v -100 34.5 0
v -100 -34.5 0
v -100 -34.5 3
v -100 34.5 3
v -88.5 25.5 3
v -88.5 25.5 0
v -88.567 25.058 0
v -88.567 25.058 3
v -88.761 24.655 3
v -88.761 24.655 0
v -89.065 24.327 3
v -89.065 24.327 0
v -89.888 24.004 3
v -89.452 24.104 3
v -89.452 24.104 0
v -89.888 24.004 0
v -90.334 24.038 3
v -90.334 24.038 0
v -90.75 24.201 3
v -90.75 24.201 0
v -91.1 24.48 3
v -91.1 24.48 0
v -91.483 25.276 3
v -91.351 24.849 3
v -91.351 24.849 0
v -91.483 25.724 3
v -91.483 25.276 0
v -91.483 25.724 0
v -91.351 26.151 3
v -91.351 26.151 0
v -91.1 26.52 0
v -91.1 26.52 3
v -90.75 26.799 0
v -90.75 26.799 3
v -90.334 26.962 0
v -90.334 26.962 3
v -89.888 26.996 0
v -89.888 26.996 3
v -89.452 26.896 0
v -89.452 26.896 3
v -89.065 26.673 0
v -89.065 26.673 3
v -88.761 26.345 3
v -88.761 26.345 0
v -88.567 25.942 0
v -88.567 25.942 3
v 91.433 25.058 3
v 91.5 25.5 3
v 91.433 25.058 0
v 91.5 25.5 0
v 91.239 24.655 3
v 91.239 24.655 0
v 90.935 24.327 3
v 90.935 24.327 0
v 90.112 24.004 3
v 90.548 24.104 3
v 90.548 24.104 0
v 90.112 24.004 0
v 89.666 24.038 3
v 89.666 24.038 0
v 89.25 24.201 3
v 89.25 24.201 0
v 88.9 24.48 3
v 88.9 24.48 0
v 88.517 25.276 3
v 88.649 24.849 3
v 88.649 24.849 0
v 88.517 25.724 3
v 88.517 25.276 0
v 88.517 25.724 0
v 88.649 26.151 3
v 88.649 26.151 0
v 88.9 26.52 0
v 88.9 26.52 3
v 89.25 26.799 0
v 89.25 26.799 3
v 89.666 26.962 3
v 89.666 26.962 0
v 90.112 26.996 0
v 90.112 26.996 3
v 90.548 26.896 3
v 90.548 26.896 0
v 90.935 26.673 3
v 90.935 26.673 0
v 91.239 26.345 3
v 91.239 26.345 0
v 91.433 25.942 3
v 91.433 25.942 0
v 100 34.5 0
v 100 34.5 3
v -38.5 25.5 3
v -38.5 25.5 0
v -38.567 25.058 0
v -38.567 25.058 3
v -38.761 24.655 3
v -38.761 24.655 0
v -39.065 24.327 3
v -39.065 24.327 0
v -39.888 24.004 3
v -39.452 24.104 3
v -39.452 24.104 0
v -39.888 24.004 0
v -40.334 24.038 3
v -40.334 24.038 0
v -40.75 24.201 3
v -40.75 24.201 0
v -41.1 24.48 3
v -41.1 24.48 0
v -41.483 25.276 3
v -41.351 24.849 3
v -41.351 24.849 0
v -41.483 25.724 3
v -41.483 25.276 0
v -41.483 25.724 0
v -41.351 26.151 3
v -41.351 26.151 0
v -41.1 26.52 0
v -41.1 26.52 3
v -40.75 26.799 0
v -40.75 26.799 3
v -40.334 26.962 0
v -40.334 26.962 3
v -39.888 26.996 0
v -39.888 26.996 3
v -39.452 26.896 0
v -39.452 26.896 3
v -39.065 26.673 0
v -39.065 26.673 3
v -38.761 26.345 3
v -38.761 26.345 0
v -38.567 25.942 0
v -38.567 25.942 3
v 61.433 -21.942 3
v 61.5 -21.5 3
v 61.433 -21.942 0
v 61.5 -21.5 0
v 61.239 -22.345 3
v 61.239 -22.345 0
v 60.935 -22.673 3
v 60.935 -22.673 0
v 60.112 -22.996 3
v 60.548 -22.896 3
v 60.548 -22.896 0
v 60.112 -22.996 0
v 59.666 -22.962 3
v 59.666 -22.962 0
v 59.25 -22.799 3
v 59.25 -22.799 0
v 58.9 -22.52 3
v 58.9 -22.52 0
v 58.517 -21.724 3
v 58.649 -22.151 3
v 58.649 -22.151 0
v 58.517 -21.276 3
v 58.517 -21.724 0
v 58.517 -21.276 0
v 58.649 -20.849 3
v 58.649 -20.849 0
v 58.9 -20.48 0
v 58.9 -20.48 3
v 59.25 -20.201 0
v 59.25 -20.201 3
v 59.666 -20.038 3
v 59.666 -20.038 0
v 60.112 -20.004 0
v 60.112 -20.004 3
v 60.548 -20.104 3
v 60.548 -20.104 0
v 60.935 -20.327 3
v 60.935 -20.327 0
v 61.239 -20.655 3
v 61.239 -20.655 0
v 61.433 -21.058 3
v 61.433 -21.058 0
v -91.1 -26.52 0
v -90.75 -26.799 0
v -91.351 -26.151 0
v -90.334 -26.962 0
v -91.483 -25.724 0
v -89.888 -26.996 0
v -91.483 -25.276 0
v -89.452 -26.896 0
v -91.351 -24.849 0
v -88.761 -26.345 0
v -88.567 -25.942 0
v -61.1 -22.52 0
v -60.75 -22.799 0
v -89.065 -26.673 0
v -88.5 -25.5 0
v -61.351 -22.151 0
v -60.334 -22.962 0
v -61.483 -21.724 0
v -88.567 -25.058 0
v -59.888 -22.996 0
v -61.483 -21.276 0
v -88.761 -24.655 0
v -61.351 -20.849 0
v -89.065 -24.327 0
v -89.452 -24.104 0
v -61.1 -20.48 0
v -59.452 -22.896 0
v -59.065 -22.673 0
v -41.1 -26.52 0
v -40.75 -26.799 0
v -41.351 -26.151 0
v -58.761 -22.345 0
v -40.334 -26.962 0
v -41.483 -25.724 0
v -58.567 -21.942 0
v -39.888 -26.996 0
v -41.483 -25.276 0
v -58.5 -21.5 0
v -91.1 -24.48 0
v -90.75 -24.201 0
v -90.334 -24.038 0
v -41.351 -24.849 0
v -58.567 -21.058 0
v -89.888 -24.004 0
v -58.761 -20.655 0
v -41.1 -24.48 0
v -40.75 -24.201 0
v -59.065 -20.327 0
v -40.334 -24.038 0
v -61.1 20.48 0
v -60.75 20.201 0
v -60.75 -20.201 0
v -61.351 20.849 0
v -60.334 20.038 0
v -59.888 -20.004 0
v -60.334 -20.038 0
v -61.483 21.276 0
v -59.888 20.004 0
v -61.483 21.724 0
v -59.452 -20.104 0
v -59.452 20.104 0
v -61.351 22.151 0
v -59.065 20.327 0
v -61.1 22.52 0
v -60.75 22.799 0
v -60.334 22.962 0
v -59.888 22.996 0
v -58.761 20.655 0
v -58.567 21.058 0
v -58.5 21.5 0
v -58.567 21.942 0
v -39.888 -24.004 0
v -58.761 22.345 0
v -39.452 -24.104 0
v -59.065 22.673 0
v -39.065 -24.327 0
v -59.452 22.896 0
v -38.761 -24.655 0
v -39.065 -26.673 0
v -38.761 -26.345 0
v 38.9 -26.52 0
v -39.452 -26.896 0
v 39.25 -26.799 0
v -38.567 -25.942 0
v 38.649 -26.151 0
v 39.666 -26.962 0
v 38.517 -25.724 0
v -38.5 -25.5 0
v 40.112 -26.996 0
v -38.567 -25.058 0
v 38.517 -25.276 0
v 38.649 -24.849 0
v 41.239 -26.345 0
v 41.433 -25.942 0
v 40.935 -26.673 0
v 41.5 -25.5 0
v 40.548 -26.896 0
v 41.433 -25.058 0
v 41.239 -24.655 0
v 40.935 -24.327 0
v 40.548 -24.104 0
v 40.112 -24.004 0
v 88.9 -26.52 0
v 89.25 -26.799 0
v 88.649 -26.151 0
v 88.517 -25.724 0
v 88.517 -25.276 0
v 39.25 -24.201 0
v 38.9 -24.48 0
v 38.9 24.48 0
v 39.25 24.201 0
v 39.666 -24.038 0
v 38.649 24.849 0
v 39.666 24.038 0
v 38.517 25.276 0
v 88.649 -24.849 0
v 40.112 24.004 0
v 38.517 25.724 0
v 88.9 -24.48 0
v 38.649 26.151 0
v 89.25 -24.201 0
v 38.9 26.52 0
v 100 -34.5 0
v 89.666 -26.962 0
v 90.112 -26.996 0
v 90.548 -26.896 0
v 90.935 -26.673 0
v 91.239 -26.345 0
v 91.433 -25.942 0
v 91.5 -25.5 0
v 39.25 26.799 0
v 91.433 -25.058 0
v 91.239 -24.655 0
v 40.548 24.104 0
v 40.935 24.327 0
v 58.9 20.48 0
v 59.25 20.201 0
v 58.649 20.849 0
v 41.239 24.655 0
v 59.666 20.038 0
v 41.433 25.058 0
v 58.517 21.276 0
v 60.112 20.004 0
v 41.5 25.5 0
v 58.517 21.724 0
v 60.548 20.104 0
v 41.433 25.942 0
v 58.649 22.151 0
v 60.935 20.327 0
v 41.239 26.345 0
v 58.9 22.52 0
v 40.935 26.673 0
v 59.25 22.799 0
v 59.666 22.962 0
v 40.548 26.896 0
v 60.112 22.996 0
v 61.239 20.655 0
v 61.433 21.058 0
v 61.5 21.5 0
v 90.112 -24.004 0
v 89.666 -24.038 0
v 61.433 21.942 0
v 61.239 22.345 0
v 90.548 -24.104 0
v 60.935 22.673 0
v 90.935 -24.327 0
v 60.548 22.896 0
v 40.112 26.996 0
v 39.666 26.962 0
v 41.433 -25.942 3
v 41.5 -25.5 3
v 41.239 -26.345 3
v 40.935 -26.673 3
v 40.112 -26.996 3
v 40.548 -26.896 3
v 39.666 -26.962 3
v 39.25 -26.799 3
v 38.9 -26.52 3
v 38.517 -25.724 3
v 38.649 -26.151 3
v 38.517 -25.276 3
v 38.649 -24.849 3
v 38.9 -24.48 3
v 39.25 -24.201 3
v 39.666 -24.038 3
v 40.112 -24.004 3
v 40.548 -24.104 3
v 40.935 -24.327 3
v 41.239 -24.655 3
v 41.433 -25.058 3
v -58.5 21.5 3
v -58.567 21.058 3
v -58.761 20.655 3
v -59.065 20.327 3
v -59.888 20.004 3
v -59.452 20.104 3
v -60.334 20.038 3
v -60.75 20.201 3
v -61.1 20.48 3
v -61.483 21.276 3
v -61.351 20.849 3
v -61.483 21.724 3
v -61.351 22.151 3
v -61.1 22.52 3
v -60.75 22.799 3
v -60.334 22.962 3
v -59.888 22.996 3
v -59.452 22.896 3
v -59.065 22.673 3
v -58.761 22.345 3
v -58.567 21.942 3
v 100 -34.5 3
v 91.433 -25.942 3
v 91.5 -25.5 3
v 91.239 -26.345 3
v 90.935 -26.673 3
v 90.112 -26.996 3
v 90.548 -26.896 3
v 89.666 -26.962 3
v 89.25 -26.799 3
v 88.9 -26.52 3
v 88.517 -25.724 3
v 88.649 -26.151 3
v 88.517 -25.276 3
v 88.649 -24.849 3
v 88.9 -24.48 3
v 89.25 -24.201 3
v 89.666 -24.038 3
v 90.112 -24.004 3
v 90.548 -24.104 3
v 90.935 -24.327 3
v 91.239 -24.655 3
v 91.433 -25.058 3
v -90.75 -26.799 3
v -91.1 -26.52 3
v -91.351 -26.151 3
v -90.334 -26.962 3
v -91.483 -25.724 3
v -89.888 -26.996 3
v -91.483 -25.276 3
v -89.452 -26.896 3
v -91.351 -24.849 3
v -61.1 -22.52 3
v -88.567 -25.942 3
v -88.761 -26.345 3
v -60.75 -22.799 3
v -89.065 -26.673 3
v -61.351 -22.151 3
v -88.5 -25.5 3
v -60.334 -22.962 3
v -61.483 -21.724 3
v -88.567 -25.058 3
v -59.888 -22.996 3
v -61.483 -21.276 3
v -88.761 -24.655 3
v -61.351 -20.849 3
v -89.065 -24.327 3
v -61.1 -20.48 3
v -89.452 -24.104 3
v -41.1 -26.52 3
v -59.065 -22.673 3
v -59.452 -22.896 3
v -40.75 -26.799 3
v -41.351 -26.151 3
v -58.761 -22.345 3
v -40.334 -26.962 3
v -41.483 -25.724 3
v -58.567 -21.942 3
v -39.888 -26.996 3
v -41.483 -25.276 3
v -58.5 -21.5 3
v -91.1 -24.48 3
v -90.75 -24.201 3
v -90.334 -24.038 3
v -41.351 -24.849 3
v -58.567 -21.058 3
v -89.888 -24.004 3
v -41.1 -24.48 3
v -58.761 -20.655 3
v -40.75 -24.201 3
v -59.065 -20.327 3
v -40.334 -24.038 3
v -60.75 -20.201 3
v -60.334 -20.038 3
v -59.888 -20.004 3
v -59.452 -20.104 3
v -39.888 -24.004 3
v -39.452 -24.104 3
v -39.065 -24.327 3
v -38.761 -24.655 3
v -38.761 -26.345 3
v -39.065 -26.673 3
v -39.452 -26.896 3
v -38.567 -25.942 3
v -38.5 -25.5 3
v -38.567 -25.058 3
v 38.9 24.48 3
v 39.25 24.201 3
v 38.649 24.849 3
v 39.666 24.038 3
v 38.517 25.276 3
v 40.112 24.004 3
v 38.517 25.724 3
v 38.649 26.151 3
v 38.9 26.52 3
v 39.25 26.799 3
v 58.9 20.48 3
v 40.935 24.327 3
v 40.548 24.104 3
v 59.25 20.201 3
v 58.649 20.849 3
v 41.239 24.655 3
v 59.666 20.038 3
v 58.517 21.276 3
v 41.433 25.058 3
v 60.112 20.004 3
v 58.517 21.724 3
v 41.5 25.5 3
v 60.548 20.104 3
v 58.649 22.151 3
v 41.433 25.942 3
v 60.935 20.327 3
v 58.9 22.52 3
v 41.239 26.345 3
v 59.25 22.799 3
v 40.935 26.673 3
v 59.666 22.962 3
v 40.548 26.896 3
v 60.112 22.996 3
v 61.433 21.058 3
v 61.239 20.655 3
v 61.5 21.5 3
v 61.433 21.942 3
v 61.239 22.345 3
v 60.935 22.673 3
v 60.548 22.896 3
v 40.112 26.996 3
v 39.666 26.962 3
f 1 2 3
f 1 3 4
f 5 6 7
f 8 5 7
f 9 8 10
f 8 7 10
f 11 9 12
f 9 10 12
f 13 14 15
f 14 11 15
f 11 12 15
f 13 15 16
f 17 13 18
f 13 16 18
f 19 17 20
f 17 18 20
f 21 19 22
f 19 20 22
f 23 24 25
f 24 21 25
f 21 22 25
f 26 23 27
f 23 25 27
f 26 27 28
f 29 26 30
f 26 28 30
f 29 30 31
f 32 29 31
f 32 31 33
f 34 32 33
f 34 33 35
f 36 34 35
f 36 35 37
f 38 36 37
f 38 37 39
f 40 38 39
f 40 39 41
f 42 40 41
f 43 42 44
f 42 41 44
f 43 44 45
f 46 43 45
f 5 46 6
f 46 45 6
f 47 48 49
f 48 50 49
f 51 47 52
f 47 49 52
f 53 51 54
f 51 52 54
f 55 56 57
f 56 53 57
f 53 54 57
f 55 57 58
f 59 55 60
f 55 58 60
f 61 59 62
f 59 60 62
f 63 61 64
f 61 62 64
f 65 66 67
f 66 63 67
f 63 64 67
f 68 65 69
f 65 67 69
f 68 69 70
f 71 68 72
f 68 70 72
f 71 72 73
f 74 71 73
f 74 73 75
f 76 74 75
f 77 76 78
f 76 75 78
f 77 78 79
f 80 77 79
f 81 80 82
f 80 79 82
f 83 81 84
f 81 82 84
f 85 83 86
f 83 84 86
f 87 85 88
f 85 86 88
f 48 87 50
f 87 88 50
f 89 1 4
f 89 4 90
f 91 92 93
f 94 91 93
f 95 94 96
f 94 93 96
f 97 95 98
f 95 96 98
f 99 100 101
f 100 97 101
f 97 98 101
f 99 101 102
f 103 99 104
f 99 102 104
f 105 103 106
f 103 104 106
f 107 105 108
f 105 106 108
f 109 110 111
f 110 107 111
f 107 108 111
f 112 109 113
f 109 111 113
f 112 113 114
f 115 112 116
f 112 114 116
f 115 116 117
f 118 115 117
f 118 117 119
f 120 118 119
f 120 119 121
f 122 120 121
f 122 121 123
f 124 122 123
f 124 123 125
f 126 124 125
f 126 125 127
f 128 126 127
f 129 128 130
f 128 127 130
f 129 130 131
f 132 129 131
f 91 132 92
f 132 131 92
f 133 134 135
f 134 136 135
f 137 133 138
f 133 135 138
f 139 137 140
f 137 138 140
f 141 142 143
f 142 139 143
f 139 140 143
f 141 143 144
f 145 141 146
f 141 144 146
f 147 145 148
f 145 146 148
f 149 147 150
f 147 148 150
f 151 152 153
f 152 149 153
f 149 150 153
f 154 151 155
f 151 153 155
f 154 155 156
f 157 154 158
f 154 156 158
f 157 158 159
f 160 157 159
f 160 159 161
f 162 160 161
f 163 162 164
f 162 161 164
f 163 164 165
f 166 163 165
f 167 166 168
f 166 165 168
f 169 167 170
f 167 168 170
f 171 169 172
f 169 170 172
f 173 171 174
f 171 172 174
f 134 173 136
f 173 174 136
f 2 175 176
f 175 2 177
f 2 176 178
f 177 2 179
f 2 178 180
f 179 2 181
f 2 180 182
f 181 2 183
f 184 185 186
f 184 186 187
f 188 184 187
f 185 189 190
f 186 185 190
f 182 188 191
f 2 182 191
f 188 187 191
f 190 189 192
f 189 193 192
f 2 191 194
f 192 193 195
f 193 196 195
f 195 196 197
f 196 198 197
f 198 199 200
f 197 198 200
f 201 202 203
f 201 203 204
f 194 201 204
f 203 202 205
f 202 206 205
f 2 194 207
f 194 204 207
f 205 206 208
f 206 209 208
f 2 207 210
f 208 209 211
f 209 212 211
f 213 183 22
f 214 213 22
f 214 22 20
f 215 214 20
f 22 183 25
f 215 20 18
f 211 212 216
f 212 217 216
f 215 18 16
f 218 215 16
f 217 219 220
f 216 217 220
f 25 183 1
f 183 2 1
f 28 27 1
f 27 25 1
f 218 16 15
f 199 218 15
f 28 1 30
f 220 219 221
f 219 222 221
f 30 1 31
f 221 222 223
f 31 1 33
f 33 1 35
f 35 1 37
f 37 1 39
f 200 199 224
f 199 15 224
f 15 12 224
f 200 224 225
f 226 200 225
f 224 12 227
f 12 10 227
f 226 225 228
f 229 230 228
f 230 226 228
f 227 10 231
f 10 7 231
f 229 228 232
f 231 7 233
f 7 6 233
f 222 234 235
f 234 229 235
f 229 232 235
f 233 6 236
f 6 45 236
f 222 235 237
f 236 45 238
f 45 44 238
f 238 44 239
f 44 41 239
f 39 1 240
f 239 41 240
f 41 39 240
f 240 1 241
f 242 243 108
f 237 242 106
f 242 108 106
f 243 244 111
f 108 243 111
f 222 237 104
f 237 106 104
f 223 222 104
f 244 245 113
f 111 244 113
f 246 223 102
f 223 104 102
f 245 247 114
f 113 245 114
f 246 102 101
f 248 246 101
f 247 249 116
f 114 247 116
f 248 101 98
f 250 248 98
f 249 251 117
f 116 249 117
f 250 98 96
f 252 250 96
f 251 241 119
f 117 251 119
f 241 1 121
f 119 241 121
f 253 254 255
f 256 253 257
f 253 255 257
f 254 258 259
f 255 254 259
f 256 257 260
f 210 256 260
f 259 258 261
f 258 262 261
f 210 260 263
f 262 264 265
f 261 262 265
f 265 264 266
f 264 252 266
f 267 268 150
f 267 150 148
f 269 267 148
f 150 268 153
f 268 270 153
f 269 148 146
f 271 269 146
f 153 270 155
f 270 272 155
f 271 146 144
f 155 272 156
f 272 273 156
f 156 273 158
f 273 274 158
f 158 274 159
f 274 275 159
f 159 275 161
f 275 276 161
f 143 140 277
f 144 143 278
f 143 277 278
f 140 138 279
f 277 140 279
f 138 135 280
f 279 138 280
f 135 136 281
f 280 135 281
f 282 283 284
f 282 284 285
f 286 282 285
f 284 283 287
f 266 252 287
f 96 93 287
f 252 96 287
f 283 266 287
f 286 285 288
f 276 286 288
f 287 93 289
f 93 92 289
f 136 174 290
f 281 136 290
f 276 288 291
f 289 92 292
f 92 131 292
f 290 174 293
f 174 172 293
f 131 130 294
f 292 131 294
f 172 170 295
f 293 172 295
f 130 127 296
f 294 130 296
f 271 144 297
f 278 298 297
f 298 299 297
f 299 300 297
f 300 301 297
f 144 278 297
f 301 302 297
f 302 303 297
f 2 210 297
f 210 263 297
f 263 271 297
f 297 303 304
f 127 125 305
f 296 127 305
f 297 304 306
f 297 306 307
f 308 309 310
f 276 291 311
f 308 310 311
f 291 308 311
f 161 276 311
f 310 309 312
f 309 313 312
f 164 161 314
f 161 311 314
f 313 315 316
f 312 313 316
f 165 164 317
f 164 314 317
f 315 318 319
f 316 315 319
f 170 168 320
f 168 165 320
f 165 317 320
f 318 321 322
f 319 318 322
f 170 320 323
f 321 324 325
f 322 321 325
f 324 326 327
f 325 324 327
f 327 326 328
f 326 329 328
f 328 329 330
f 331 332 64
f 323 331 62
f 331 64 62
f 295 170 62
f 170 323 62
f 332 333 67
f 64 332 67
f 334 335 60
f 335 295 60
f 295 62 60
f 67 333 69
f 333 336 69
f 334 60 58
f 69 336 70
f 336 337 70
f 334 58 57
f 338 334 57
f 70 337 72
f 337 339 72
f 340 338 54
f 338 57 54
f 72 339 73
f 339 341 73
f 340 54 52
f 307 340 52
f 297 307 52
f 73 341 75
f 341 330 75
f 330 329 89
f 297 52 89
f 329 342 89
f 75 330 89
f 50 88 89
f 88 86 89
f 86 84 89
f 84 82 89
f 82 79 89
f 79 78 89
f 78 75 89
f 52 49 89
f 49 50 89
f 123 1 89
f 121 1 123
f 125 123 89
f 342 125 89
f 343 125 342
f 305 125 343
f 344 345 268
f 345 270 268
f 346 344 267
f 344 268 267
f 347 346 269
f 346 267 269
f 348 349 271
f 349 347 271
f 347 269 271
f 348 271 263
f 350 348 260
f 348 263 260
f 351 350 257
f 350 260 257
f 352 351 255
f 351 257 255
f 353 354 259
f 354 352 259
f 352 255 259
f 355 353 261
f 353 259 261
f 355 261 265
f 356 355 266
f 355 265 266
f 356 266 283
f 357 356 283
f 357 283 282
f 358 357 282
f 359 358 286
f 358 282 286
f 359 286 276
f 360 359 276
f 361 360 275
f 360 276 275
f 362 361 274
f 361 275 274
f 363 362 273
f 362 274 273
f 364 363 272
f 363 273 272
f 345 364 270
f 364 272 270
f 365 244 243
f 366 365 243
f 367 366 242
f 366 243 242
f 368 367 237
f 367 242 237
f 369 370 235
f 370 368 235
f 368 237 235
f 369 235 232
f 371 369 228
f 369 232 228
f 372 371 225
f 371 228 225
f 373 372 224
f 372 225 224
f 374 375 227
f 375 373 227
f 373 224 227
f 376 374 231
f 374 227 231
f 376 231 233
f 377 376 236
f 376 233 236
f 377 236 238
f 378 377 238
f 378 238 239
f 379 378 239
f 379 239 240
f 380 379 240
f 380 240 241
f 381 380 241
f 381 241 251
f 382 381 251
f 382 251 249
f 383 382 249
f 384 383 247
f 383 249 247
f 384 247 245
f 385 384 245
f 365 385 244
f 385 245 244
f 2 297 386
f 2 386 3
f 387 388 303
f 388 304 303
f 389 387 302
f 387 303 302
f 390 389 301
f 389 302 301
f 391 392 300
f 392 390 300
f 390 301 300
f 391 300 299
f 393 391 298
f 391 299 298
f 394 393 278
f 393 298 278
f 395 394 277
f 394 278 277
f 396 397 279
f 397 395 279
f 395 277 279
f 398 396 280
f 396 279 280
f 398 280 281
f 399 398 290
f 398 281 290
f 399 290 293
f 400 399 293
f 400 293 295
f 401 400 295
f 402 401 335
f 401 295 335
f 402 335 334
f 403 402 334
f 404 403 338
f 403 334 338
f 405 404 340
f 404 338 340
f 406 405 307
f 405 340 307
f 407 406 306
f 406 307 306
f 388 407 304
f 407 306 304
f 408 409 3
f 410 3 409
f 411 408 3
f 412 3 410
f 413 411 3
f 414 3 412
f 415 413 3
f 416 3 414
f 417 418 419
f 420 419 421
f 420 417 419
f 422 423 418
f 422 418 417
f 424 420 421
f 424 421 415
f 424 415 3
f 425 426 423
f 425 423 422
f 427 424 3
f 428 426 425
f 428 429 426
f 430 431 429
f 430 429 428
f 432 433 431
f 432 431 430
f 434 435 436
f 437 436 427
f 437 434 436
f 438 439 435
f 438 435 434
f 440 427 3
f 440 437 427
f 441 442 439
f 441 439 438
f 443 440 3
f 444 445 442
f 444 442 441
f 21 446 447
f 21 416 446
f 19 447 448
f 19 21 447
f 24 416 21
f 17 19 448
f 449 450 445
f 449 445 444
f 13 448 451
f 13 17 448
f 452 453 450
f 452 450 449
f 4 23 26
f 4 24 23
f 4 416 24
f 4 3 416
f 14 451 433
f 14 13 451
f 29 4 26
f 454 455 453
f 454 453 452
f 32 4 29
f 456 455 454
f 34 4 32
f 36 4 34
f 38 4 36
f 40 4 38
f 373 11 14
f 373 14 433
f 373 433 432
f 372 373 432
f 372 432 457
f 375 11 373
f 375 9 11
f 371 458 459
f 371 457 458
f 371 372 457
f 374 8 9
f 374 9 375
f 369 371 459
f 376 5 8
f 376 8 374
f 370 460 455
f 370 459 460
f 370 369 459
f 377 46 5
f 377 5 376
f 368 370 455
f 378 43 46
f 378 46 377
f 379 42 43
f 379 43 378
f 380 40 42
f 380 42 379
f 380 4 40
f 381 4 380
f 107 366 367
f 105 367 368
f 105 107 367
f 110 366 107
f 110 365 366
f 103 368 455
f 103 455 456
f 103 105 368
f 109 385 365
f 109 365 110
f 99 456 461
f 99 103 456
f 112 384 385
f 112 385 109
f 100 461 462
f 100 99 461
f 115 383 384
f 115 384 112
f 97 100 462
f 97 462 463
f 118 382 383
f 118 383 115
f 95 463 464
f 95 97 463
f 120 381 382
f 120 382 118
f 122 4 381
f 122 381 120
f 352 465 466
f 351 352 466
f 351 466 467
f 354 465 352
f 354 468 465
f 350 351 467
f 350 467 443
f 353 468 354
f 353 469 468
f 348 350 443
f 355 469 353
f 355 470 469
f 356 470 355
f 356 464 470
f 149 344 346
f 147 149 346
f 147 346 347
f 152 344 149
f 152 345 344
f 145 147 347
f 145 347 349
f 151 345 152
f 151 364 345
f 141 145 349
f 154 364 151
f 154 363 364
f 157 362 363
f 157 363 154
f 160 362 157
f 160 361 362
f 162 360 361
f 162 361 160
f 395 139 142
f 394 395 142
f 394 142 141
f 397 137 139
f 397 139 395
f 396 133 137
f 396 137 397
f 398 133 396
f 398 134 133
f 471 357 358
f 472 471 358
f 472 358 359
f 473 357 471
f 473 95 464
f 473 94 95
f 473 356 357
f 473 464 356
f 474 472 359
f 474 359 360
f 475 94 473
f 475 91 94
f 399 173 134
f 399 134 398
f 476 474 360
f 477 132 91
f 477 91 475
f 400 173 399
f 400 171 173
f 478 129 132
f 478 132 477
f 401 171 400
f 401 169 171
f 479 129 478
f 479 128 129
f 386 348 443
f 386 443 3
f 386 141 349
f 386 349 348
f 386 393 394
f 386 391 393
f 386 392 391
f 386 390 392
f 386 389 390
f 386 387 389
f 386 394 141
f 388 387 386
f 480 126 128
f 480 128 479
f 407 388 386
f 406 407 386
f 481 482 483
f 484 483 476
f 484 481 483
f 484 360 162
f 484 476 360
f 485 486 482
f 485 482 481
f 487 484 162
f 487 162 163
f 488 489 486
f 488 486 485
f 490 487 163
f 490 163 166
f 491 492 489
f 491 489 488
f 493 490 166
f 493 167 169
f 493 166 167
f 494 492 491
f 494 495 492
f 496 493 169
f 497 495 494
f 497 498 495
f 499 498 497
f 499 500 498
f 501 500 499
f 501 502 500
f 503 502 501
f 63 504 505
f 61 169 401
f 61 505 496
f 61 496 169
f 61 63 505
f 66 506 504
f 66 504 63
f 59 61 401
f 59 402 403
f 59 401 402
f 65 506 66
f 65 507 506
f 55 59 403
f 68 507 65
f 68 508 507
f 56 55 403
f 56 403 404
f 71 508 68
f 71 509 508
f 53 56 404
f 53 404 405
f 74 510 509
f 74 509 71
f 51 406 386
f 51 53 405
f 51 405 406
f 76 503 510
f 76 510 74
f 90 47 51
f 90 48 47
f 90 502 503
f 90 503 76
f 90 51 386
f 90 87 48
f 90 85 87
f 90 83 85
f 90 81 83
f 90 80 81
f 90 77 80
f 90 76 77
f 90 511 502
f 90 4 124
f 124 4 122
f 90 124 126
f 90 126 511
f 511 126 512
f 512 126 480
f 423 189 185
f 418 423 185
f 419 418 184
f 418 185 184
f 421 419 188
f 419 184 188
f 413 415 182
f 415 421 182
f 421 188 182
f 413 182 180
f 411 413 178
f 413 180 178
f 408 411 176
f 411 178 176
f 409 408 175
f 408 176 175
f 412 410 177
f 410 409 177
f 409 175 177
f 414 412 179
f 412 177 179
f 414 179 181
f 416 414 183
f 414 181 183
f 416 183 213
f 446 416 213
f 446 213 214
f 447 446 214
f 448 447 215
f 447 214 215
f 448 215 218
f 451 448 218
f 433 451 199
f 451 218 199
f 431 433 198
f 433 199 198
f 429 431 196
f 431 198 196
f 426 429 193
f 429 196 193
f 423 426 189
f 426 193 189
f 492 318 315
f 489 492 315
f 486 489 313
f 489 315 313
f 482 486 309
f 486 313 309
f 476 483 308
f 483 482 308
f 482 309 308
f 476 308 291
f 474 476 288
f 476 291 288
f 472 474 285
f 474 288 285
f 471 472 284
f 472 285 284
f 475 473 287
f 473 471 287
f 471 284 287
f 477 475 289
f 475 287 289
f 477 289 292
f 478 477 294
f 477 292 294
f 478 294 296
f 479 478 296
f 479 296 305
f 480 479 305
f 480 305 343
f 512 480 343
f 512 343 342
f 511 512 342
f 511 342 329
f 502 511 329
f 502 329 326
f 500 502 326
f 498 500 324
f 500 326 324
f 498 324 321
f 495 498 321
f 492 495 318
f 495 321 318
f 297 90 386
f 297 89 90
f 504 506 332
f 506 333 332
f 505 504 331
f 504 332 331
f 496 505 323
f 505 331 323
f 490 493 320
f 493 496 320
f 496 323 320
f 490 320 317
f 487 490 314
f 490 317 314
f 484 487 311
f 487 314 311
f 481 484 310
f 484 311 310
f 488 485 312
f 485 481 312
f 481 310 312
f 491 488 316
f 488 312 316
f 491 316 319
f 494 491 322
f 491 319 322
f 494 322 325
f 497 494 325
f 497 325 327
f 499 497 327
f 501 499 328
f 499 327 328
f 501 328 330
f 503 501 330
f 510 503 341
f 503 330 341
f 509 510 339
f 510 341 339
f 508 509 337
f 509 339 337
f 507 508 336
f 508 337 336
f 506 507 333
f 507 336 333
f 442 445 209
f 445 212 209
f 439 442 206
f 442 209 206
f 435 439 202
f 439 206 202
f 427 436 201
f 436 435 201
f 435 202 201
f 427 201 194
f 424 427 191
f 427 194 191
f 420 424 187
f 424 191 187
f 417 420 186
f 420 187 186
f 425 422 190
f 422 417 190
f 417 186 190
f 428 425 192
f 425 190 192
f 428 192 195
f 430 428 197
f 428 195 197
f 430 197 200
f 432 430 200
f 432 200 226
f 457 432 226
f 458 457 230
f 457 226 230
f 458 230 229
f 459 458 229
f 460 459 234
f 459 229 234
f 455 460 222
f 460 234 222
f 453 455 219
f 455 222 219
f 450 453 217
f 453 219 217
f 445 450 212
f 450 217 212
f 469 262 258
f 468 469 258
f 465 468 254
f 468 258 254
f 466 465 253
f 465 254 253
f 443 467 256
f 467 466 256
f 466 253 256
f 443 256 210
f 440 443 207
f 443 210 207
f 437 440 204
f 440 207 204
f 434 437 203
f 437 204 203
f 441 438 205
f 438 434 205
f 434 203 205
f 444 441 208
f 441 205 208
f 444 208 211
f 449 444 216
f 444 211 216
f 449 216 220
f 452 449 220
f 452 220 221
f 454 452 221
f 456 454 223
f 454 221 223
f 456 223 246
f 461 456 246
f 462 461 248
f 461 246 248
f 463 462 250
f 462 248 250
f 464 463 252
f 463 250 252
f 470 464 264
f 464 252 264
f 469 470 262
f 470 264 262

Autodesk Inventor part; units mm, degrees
ref_plane "YZ Plane" through (0, 0, 0) normal (1, 0, 0) x (0, 1, 0)
ref_plane "XZ Plane" through (0, 0, 0) normal (0, 1, 0) x (-1, 0, 0)
ref_plane "XY Plane" through (0, 0, 0) normal (0, 0, 1) x (1, 0, 0)
sketch "Sketch1" plane through (0, 0, 0) normal (0, 0, 1) x (1, 0, 0)
  line L0 (-100, 34.4999) -> (100, 34.4999)
  line L1 (100, 34.4999) -> (100, -34.4999)
  line L2 (100, -34.4999) -> (-100, -34.4999)
  line L3 (-100, -34.4999) -> (-100, 34.4999)
  line L4 (-100, 34.4999) -> (100, -34.4999) construction
  line L5 (100, 34.4999) -> (-100, -34.4999) construction
  circle A0 centre (40, 25.5) radius 1.5
  line L6 (-40, 55.9999) -> (160, -12.9999) construction
  line L7 (160, 55.9999) -> (-40, -12.9999) construction
  circle A1 centre (60, 21.5) radius 1.5
  circle A2 centre (90, 25.5) radius 1.5
  circle A3 centre (-40, -25.5) radius 1.5
  circle A4 centre (40, -25.5) radius 1.5
  circle A5 centre (-40, 25.5) radius 1.5
  circle A6 centre (-60, -21.5) radius 1.5
  circle A7 centre (-60, 21.5) radius 1.5
  circle A8 centre (60, -21.5) radius 1.5
  circle A9 centre (90, -25.5) radius 1.5
  circle A10 centre (-90, -25.5) radius 1.5
  circle A11 centre (-90, 25.5) radius 1.5
extrude "Extrusion1" add sketch "Sketch1" along normal blind 3
properties part number "Power Distribution Board - Chassis redo"
